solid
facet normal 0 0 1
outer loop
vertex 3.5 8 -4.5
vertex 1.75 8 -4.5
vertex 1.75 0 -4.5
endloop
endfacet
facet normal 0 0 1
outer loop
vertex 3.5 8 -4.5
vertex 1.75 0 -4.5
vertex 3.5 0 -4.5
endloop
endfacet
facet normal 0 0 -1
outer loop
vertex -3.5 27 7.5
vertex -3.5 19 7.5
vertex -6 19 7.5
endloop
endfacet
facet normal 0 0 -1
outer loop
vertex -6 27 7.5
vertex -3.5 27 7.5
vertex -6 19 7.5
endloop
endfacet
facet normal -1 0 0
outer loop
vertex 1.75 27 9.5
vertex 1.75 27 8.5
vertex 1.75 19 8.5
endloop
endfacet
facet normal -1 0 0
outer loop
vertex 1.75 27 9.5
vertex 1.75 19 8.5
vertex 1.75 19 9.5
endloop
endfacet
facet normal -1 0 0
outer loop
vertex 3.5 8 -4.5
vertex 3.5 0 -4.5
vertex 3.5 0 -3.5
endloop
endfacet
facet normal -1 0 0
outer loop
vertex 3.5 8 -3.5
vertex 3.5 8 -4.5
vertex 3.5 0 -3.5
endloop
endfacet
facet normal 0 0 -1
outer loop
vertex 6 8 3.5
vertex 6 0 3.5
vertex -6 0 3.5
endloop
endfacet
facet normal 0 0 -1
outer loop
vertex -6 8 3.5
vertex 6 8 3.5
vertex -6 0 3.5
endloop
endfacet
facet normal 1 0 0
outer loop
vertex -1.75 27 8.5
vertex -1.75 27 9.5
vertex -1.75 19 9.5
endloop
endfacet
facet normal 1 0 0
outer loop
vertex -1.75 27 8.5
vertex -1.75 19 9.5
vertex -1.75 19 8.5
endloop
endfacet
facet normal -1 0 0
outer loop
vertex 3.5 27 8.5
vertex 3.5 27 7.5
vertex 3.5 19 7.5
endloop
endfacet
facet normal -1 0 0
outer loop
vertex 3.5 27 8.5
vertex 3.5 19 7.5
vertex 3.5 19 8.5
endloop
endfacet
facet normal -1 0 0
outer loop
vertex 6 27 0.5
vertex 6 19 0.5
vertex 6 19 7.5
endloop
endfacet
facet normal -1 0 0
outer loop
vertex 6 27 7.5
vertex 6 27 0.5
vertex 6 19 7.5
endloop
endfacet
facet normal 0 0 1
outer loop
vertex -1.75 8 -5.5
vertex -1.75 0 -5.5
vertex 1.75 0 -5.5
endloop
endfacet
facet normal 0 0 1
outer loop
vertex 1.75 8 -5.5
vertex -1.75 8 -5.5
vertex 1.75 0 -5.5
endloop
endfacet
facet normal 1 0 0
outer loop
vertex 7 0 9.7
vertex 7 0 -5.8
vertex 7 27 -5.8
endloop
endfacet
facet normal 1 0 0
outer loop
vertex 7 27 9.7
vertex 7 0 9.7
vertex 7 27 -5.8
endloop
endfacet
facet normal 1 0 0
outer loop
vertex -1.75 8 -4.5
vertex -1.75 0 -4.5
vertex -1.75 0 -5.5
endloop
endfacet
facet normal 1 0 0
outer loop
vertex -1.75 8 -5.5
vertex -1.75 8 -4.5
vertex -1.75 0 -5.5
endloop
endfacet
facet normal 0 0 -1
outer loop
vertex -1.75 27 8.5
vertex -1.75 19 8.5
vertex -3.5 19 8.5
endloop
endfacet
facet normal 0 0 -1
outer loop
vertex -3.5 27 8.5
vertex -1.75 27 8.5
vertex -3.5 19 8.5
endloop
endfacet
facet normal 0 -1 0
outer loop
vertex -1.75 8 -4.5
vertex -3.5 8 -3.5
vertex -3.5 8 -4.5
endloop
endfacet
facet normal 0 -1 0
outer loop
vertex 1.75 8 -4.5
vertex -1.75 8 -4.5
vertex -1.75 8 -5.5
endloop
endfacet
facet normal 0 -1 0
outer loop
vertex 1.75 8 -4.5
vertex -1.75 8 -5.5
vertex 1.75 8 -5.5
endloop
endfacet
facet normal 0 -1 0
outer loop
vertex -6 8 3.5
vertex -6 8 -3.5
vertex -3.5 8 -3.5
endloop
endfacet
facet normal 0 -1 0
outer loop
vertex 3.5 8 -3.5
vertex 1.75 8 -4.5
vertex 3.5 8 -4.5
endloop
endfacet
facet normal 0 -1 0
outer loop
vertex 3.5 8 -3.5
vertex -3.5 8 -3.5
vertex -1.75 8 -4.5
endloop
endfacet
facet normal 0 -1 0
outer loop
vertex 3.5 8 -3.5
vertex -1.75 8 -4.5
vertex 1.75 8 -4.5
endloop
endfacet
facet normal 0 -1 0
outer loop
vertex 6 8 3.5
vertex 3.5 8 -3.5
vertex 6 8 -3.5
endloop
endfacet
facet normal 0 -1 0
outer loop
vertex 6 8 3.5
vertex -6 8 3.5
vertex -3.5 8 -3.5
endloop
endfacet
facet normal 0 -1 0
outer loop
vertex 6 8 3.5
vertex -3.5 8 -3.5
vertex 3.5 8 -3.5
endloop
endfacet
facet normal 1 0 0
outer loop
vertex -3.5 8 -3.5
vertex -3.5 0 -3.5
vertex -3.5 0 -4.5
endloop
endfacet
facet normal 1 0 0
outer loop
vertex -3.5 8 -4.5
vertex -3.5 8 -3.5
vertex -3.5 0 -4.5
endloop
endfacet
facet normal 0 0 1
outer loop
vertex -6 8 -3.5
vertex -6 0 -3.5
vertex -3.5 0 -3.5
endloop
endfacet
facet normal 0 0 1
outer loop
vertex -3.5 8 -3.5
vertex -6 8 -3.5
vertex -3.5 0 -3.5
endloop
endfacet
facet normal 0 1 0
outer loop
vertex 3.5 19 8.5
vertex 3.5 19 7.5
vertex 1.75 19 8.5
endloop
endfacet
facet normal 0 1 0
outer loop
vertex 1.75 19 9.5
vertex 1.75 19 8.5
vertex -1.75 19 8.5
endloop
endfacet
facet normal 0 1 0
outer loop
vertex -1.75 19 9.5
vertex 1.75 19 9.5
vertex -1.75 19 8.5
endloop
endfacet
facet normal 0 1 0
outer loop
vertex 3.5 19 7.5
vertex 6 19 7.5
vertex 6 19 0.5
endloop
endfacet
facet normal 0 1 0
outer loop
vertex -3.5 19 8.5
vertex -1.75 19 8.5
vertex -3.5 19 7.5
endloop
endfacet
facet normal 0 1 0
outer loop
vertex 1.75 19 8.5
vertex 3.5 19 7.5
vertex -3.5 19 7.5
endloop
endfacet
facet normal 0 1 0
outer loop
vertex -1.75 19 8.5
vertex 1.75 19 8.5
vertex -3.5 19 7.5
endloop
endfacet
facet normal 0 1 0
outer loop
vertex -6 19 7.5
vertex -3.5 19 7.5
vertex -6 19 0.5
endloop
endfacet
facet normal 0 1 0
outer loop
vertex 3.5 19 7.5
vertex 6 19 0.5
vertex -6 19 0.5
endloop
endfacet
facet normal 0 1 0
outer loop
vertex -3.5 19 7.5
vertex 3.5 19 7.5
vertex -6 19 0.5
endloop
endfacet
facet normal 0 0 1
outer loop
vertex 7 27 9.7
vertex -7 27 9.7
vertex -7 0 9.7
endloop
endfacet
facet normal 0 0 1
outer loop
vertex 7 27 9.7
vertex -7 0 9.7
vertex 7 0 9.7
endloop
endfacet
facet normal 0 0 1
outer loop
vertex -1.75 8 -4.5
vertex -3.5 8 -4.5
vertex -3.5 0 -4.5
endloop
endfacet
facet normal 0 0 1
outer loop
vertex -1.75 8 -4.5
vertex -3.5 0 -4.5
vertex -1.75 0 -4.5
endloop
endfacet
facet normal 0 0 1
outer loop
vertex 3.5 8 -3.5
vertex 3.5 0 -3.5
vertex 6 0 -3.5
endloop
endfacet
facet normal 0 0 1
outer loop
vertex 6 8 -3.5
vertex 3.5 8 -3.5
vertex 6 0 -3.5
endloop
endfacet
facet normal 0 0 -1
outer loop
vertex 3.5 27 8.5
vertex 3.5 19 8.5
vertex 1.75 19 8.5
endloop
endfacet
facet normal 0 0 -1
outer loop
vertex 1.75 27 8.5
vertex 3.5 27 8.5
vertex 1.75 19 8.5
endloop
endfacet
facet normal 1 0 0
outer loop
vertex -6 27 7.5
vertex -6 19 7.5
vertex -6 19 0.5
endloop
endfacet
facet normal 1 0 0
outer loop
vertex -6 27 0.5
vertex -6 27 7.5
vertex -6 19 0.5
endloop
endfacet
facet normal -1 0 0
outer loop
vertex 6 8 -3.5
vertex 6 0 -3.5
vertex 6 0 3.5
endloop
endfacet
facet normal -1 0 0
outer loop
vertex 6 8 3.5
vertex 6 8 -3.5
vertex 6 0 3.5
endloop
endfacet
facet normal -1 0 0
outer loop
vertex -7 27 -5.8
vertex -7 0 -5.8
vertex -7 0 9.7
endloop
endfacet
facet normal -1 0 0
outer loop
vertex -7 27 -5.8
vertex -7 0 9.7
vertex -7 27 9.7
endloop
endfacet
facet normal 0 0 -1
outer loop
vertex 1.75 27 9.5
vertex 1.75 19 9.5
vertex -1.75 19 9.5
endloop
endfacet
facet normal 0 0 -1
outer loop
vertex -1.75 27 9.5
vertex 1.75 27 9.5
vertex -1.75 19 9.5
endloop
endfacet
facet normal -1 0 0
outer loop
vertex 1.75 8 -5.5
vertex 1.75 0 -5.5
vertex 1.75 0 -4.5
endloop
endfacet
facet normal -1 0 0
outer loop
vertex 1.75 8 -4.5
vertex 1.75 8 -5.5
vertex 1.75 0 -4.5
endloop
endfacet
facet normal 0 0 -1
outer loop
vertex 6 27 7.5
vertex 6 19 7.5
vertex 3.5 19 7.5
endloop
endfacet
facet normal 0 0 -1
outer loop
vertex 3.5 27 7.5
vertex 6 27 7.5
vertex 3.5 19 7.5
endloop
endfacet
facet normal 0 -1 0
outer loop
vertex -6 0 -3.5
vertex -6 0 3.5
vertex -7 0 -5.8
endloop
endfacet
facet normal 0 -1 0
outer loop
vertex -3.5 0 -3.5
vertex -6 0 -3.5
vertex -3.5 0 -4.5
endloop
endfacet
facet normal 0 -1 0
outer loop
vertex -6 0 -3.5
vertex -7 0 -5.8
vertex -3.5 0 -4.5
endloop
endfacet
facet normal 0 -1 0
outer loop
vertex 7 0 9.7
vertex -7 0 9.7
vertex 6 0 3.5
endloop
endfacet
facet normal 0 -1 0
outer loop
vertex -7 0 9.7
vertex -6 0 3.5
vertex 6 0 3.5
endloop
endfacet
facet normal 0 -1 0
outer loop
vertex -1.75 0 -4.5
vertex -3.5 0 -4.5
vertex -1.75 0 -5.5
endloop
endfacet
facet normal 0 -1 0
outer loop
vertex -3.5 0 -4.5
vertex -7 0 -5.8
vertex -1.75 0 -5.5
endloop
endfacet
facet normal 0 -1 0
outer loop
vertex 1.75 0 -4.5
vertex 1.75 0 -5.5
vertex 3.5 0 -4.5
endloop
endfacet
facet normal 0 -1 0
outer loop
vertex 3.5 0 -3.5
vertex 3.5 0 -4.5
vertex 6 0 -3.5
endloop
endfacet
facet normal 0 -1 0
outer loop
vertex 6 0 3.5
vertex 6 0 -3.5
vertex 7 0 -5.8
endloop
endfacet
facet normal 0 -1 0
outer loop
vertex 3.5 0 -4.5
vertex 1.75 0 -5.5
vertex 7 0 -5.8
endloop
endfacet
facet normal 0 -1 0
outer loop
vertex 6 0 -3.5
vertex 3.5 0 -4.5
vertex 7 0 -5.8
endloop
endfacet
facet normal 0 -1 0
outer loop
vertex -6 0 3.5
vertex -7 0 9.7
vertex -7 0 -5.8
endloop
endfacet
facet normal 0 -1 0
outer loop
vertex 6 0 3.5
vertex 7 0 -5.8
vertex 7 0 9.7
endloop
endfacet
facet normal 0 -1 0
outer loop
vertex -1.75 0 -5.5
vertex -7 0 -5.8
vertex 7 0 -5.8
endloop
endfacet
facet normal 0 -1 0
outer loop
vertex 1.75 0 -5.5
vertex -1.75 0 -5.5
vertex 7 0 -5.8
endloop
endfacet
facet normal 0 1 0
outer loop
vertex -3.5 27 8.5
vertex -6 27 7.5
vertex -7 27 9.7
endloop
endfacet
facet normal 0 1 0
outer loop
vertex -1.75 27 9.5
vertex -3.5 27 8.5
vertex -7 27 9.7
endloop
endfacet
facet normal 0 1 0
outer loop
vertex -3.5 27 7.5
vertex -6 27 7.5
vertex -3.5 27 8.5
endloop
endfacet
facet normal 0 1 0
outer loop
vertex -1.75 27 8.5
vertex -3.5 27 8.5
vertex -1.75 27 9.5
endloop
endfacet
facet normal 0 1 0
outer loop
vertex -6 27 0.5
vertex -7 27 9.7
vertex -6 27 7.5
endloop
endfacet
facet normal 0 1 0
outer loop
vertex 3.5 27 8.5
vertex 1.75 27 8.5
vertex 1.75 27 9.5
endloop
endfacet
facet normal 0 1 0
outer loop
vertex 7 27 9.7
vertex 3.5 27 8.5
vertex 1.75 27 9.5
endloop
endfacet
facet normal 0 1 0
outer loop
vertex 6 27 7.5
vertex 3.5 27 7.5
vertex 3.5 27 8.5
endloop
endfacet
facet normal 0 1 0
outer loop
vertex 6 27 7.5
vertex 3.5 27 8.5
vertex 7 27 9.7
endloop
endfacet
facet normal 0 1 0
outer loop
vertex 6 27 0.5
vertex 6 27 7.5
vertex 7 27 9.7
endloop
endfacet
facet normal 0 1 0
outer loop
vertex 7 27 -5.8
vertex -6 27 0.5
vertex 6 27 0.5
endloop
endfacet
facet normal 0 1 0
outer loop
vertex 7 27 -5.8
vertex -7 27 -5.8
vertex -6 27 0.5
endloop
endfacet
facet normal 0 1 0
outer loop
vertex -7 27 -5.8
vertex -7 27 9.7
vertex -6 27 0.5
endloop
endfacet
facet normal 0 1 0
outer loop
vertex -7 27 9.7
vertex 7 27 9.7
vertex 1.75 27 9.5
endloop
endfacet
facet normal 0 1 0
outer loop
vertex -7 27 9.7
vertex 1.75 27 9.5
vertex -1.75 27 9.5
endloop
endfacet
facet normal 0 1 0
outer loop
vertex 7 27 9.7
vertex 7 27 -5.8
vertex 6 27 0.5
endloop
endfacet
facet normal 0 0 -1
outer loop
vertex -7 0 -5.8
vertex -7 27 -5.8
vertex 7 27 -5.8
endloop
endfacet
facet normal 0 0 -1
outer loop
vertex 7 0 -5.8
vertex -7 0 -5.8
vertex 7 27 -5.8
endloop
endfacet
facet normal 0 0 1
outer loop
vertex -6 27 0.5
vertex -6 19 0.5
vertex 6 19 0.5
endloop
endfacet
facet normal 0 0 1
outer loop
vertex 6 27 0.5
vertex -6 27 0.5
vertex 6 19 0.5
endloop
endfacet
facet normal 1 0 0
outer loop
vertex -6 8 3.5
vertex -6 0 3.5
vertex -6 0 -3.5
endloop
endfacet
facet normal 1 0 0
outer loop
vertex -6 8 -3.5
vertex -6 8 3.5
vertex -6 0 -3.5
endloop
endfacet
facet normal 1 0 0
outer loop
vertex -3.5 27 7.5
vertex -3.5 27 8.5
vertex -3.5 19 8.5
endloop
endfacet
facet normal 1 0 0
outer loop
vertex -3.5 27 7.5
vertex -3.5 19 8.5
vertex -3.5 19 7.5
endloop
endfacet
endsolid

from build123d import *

# Parameters (mm, degrees)
PAD046_DEPTH = 8
PAD045_DEPTH = 8
BOX008_W     = 14
BOX008_H     = 27
BOX008_DEPTH = 15.5


with BuildPart() as rj45_cutout2:
    # Sketch047 → Pad046 (new body)
    with BuildSketch(Plane(origin=(0, 19, 4), x_dir=(1, 0, 0), z_dir=(0, 1, 0))):
        Polygon((-6, 3.5), (6, 3.5), (6, -3.5), (3.5, -3.5), (3.5, -4.5), (1.75, -4.5), (1.75, -5.5), (-1.75, -5.5), (-1.75, -4.5), (-3.5, -4.5), (-3.5, -3.5), (-6, -3.5), align=None)
    extrude(amount=PAD046_DEPTH)


with BuildPart() as rj45_cutout1:
    # Sketch046 → Pad045 (new body)
    with BuildSketch(Plane(origin=(0, 0, 0), x_dir=(-1, 0, 0), z_dir=(0, 1, 0))):
        Polygon((-6, 3.5), (6, 3.5), (6, -3.5), (3.5, -3.5), (3.5, -4.5), (1.75, -4.5), (1.75, -5.5), (-1.75, -5.5), (-1.75, -4.5), (-3.5, -4.5), (-3.5, -3.5), (-6, -3.5), align=None)
    extrude(amount=PAD045_DEPTH)


with BuildPart() as rj45_adapter:
    # Box008 → Box008 (new body)
    with BuildSketch(Plane(origin=(-7, 0, -5.8), x_dir=(1, 0, 0), z_dir=(0, 0, 1))):
        with Locations((7, 13.5)):
            Rectangle(BOX008_W, BOX008_H)
    extrude(amount=BOX008_DEPTH)

    # Cut015: cut RJ45_cutout1
    add(rj45_cutout1.part, mode=Mode.SUBTRACT)

    # Cut016: cut RJ45_cutout2
    add(rj45_cutout2.part, mode=Mode.SUBTRACT)


solid = rj45_adapter.part
